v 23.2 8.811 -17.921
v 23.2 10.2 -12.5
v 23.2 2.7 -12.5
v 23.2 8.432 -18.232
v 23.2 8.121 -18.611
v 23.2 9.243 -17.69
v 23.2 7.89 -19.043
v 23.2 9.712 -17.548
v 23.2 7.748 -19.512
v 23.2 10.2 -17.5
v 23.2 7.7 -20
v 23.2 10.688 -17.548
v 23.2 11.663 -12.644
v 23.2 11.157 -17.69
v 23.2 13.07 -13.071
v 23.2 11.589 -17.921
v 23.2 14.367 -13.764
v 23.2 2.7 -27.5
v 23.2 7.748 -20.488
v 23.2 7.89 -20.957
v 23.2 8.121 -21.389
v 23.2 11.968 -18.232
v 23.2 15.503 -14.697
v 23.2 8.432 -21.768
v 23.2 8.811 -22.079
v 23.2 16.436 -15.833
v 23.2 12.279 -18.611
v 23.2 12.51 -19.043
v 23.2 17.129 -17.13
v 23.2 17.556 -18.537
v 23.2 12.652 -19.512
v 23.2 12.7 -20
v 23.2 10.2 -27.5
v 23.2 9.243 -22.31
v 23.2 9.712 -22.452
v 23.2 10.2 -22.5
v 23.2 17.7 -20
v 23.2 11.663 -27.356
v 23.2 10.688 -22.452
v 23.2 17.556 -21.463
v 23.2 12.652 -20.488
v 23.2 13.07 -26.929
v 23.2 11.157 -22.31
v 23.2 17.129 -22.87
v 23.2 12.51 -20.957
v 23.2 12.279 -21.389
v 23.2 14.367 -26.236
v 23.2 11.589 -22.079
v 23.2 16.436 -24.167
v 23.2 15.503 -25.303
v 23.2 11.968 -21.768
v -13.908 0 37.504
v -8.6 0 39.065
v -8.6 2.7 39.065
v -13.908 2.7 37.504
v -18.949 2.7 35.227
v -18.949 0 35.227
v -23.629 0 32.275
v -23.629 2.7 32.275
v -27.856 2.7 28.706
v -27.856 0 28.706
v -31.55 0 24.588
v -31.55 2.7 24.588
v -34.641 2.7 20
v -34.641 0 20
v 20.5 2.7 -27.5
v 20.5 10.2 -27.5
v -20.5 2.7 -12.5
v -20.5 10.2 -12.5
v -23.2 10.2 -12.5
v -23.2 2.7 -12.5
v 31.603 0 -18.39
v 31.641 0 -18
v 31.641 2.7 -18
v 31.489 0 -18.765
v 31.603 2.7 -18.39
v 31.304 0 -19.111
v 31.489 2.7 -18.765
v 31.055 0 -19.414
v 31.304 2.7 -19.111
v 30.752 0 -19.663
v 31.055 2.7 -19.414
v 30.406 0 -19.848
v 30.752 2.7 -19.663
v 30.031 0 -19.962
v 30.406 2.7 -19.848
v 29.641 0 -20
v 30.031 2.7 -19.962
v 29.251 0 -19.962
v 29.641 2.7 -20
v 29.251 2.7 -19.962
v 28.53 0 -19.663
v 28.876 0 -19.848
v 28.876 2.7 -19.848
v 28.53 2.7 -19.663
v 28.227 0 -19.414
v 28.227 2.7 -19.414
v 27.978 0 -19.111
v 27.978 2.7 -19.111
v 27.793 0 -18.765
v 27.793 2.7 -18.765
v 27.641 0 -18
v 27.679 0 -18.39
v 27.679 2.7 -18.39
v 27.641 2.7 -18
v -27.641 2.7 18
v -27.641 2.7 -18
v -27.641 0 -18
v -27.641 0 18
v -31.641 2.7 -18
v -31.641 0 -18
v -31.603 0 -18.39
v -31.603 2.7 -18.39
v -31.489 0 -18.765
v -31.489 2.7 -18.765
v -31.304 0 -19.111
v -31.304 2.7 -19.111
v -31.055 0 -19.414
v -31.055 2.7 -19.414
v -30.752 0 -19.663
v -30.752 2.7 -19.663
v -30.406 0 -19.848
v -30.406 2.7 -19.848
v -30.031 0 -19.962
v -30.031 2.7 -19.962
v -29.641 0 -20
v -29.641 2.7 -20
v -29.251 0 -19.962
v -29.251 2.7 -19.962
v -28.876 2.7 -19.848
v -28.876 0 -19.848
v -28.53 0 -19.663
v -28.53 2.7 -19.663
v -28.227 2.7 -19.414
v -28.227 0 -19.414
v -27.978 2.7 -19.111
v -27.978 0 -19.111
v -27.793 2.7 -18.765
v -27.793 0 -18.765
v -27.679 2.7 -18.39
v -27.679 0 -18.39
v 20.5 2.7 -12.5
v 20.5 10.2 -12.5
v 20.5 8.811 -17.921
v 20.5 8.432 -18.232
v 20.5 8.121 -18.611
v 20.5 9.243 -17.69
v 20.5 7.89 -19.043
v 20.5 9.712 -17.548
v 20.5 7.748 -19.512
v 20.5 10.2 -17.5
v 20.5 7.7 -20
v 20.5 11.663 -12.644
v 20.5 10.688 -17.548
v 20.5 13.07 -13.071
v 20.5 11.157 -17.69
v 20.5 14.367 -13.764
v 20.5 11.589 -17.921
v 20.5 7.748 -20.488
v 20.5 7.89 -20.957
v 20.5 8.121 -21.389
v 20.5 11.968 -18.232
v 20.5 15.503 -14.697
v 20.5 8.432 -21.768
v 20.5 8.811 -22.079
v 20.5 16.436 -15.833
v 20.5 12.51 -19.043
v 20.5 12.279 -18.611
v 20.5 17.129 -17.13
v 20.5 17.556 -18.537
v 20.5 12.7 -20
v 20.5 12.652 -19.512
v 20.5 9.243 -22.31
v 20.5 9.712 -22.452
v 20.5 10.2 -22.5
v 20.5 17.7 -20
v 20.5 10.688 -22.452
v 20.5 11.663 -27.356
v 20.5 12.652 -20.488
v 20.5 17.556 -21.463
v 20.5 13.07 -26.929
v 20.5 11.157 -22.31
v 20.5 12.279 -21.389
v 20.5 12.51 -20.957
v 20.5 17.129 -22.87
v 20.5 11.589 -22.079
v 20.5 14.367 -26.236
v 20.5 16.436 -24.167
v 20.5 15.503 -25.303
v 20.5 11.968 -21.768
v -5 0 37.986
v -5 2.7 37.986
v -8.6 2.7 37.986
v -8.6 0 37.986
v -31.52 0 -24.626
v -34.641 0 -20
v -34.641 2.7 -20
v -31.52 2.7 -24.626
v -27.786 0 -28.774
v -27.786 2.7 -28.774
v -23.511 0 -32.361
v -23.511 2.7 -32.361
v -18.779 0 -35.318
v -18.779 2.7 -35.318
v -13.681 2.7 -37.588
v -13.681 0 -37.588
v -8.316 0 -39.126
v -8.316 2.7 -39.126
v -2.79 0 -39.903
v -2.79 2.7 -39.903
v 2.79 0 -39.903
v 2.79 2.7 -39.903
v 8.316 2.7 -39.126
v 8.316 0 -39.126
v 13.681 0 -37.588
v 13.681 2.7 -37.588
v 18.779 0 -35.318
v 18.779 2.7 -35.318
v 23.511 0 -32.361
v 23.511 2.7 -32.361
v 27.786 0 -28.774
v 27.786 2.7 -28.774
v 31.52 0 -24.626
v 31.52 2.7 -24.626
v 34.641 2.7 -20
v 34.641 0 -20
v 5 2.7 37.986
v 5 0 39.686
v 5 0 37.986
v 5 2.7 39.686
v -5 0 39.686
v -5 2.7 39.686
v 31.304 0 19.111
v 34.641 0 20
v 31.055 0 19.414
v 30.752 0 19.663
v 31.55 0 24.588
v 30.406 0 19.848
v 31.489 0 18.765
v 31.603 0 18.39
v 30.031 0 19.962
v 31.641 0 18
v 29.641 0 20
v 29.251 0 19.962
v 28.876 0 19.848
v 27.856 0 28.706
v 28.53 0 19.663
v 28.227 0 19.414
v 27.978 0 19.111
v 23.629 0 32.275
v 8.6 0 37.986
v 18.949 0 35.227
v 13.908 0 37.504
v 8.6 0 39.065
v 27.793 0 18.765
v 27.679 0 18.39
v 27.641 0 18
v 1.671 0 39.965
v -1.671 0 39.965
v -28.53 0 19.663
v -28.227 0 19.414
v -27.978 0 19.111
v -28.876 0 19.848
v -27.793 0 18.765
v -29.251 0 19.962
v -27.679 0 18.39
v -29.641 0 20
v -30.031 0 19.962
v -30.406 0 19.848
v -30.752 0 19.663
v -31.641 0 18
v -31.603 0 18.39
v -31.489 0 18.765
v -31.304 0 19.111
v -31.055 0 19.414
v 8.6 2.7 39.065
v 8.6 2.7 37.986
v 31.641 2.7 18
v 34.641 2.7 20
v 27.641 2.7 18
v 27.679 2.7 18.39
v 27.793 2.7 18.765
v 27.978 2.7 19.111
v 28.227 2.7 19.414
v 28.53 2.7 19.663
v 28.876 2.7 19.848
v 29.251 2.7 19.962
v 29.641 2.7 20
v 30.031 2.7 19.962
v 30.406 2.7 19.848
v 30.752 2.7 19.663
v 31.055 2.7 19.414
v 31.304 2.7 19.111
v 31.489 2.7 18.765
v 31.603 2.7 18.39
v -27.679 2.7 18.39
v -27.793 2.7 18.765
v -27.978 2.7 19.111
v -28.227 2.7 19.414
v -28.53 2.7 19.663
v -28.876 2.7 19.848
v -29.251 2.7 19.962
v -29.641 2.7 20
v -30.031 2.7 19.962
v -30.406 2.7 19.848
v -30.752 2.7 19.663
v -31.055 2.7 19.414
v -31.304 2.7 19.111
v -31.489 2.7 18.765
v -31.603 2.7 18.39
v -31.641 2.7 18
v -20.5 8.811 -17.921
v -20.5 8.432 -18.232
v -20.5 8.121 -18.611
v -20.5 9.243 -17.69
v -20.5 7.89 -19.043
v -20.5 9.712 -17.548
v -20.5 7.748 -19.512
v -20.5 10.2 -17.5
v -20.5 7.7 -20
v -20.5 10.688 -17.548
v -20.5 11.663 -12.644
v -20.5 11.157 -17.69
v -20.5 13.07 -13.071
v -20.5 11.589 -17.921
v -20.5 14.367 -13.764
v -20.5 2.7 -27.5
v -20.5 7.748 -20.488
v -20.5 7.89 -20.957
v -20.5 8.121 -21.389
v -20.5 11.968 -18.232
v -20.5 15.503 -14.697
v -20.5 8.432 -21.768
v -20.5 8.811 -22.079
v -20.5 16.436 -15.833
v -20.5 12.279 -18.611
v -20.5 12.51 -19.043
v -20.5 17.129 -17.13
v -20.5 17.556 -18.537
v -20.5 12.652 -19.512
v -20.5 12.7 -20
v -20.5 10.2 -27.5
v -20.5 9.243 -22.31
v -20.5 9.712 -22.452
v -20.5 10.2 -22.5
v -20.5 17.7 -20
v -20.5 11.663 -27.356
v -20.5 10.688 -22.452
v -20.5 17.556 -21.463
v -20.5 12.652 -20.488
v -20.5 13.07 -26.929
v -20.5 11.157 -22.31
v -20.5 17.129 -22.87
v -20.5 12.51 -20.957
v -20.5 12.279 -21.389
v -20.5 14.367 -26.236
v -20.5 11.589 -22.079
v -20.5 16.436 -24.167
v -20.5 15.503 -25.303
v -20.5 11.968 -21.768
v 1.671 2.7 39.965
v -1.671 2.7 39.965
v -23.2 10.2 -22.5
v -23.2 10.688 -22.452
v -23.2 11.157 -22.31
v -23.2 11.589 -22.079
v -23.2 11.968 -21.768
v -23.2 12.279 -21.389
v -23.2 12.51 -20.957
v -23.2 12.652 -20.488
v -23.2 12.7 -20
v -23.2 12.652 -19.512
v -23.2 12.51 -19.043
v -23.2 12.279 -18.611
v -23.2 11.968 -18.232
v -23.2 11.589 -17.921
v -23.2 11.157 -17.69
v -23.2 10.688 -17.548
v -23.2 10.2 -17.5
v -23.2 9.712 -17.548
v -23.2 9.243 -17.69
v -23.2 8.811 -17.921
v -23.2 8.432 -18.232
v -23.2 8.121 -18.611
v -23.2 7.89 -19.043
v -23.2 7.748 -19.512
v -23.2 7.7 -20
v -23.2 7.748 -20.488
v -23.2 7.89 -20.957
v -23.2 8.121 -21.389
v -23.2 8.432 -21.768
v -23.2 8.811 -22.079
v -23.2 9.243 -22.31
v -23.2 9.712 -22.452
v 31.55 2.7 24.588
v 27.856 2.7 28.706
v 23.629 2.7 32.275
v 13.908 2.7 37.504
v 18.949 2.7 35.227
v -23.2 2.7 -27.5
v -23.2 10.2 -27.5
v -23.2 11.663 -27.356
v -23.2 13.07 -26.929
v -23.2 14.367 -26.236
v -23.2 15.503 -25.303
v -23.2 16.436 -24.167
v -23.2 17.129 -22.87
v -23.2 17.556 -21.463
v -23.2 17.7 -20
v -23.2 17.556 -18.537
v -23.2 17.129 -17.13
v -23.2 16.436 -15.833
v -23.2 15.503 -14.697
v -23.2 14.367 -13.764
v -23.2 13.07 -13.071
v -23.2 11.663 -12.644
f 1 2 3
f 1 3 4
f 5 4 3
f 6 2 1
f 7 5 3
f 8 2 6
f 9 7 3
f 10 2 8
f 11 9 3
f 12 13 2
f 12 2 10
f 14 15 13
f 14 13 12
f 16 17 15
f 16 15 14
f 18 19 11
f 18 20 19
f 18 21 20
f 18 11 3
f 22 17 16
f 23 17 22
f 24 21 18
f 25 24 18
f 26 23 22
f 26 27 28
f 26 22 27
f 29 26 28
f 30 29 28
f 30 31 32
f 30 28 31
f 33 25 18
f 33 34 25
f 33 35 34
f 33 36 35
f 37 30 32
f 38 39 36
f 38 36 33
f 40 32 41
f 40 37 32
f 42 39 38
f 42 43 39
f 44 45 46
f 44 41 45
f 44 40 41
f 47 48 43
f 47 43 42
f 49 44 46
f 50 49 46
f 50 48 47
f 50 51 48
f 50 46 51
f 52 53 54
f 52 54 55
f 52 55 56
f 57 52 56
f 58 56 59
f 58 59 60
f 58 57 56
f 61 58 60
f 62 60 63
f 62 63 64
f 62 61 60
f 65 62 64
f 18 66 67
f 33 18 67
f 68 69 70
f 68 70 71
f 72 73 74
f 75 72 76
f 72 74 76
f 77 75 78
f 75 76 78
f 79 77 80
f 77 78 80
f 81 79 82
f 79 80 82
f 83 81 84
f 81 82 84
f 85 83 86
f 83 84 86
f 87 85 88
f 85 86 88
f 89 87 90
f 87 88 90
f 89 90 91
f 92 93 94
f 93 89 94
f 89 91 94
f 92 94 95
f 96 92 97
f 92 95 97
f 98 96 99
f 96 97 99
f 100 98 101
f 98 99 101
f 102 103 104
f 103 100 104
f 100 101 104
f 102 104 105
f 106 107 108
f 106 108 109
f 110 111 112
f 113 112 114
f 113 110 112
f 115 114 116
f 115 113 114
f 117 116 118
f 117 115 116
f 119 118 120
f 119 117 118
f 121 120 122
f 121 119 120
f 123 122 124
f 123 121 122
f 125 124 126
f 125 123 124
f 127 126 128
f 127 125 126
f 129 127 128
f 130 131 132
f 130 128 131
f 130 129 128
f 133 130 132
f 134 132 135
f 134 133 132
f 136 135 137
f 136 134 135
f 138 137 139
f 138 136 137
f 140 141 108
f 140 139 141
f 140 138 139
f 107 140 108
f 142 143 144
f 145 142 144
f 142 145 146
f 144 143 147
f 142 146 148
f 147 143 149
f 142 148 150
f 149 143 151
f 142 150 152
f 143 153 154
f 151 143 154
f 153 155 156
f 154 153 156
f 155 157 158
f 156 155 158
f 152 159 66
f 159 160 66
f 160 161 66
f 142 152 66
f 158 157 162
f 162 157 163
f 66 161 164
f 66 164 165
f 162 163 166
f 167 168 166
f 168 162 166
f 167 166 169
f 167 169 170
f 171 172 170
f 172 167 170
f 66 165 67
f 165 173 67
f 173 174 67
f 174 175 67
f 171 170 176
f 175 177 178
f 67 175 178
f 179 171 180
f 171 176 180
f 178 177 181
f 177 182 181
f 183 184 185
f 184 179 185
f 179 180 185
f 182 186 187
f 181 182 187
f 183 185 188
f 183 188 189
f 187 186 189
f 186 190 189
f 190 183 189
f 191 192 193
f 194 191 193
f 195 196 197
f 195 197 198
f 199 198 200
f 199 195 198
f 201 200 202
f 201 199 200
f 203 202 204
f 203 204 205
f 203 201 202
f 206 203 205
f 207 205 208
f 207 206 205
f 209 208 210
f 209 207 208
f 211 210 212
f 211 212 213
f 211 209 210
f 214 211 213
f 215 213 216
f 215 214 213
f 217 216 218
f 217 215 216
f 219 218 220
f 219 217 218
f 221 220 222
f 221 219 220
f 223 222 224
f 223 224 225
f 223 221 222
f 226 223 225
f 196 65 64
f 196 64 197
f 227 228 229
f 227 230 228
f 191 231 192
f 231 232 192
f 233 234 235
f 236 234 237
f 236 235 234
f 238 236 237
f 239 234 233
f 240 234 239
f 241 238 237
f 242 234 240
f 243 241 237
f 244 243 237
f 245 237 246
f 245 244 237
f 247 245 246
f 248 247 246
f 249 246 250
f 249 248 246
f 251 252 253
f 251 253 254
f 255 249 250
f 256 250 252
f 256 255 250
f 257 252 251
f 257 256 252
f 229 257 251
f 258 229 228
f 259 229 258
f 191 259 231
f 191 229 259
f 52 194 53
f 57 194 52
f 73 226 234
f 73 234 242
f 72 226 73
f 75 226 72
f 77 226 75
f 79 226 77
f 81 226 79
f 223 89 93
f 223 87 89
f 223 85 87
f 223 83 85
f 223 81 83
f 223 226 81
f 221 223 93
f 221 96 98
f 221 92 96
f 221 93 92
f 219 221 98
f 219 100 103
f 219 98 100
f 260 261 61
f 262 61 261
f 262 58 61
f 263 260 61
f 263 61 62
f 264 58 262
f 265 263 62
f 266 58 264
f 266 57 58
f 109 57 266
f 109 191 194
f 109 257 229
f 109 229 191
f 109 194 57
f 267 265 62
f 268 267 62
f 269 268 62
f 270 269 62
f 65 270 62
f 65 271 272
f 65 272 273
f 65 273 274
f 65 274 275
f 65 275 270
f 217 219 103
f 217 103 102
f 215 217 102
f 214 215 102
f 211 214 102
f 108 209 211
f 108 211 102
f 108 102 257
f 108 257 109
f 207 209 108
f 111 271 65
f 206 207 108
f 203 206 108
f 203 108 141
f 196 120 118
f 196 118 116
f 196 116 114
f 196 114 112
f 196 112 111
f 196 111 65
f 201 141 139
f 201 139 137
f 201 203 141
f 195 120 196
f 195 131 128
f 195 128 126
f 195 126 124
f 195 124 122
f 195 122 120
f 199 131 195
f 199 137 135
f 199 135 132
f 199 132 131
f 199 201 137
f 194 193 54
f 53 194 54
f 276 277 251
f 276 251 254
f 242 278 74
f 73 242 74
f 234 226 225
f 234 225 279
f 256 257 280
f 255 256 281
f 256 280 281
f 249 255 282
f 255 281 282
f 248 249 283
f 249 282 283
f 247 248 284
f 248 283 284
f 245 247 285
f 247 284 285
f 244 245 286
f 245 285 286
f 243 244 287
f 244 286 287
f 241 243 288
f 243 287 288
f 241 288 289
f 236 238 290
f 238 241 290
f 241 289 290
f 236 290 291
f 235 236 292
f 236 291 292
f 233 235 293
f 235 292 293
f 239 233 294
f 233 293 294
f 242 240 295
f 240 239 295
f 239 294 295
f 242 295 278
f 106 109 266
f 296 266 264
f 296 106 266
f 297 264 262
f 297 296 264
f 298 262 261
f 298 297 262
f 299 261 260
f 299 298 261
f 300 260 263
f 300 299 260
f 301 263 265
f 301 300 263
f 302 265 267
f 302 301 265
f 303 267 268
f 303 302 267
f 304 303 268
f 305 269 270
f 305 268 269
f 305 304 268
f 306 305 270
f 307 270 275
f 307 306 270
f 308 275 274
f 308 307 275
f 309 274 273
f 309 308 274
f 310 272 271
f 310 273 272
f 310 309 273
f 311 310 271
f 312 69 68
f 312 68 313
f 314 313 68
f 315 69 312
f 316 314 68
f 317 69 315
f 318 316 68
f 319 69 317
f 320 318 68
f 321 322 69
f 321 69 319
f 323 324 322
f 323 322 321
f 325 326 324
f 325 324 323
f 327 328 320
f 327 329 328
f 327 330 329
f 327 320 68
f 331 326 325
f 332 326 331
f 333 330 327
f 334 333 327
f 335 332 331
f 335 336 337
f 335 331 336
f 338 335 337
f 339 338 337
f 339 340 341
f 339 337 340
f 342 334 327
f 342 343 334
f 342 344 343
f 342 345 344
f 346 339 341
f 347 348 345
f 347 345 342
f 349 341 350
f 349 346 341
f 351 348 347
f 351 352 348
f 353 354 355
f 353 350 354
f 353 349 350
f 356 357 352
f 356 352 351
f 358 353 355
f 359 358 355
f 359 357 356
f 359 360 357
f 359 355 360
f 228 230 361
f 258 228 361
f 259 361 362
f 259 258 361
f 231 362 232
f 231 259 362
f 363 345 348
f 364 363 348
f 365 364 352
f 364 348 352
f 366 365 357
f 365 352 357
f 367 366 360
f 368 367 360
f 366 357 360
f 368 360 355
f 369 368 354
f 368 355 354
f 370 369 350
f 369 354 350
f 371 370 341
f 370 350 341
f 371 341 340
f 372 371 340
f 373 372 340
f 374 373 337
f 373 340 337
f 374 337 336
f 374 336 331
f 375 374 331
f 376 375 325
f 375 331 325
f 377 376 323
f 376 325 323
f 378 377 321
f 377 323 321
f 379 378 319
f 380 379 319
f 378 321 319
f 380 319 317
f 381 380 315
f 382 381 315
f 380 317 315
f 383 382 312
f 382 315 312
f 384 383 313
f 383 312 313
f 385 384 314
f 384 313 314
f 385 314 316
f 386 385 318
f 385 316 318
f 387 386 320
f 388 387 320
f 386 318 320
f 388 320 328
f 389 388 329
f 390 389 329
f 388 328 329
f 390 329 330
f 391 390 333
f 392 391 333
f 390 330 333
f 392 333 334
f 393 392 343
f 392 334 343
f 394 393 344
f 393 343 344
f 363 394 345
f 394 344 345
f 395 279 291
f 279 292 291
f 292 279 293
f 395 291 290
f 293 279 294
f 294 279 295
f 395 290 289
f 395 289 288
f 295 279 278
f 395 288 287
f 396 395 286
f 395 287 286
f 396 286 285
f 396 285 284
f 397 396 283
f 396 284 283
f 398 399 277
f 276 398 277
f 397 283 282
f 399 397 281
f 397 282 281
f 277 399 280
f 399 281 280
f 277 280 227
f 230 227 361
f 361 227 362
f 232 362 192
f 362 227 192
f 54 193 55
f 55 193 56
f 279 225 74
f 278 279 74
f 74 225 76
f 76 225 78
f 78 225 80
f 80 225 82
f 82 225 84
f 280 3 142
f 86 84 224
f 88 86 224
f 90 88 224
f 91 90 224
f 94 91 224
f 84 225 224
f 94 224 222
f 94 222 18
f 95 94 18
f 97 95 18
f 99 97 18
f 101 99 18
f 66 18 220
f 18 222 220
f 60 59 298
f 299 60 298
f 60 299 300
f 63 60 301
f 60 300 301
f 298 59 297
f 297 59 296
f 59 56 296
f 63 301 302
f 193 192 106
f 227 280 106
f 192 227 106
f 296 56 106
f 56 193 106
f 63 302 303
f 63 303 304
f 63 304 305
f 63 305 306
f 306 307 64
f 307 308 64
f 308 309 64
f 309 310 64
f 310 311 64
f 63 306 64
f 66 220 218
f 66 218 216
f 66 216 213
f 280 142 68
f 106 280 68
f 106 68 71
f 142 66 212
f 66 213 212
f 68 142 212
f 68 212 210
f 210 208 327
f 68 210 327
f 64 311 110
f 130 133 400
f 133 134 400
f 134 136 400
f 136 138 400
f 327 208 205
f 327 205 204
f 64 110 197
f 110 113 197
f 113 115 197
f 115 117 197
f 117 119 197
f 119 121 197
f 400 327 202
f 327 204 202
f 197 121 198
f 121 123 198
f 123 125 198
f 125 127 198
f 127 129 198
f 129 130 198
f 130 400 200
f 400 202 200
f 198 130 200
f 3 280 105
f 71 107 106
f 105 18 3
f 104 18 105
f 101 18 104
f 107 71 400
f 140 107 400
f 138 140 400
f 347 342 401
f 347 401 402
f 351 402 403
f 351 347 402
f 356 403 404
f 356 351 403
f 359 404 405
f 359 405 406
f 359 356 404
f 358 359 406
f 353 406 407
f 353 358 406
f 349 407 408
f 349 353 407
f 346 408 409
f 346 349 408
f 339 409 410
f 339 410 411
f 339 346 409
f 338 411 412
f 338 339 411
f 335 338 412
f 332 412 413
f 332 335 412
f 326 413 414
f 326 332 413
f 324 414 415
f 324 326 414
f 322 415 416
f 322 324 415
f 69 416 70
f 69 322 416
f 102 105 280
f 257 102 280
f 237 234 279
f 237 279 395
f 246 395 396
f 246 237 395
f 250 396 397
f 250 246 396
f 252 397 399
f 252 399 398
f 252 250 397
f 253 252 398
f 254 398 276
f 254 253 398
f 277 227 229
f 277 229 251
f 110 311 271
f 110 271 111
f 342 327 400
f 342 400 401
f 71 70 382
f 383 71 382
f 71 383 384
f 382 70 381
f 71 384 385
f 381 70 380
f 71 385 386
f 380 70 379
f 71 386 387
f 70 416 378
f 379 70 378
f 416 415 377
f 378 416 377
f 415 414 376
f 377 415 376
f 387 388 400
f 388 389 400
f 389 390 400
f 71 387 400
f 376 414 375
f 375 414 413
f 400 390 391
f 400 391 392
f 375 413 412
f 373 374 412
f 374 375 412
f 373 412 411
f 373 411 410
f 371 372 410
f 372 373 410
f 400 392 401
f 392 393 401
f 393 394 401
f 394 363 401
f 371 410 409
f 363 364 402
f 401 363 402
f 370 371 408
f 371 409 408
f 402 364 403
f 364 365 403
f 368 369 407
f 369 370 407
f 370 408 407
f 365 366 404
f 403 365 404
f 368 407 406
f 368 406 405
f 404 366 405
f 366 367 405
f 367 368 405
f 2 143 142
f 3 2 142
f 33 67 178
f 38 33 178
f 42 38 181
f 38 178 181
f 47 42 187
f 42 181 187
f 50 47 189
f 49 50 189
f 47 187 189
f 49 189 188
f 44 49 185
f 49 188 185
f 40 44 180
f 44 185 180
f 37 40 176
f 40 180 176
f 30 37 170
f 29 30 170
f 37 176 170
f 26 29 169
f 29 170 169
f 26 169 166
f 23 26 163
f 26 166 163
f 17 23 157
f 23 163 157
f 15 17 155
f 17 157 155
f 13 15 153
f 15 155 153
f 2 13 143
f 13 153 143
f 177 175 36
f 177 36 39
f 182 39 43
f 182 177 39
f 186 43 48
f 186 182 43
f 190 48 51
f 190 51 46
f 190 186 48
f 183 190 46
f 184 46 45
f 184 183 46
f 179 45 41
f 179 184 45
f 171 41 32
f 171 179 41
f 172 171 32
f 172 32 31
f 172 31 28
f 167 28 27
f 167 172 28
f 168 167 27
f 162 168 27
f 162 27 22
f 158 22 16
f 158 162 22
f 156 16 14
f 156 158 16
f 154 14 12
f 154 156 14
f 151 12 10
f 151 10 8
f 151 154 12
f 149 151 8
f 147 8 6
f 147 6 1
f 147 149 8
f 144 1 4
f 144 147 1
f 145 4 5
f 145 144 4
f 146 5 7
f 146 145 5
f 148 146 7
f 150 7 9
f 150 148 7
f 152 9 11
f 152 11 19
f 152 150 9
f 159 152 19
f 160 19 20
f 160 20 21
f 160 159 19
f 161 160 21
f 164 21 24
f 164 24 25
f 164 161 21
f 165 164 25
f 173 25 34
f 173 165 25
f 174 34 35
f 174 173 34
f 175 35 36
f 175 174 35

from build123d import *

# Parameters (mm, degrees)
BASE_DEPTH            = 2.7
WHEEL_HOLE_REACH      = 54.984
SKETCH3_R             = 2.5
BATTERY_HOLDER_DEPTH  = 2.7
IR_SENSOR_DIVOT_DEPTH = 56


with BuildPart() as part:
    # Sketch1 → Base (new body)
    with BuildSketch(Plane(origin=(0, 0, 0), x_dir=(1, 0, 0), z_dir=(0, 1, 0))):
        with BuildLine():
            Line((34.641016151, 20), (34.641016151, -20))
            ThreePointArc((34.641016151, -20), (0, -40), (-34.641016151, -20))
            Line((-34.641016151, -20), (-34.641016151, 20))
            ThreePointArc((-34.641016151, 20), (0, 40), (34.641016151, 20))
        make_face()
    extrude(amount=BASE_DEPTH)

    # Sketch2 → Wheel Hole (cut, up to next)
    with BuildSketch(Plane(origin=(0, 2.7, 0), x_dir=(-1, 0, 0), z_dir=(0, 1, 0)), mode=Mode.PRIVATE) as wheel_hole_sk1:
        with BuildLine():
            Line((27.641016151, -18), (27.641016151, 18))
            ThreePointArc((27.641016151, 18), (29.641016151, 20), (31.641016151, 18))
            Line((31.641016151, 18), (31.641016151, -18))
            ThreePointArc((31.641016151, -18), (29.641016151, -20), (27.641016151, -18))
        make_face()
    wheel_hole_tool1 = extrude(wheel_hole_sk1.sketch, amount=-WHEEL_HOLE_REACH, mode=Mode.PRIVATE) & part.part
    wheel_hole = wheel_hole_tool1.solids().sort_by_distance((-29.641016, 2.7, 0))[0]
    add(wheel_hole, mode=Mode.SUBTRACT)

    # Sketch3 → Battery Holder (add)
    with BuildSketch(Plane(origin=(-20.5, 0, 0), x_dir=(0, 0, -1), z_dir=(1, 0, 0))):
        with BuildLine():
            Line((27.5, 2.7), (27.5, 10.2))
            ThreePointArc((27.5, 10.2), (20, 17.7), (12.5, 10.2))
            Line((12.5, 10.2), (12.5, 2.7))
            Line((12.5, 2.7), (27.5, 2.7))
        make_face()
        with Locations((20, 10.2)):
            Circle(SKETCH3_R, mode=Mode.SUBTRACT)
    battery_holder = extrude(amount=-BATTERY_HOLDER_DEPTH)

    # Sketch5 → IR Sensor Divot (cut, symmetric)
    with BuildSketch(Plane(origin=(0, 2.7, 0), x_dir=(-1, 0, 0), z_dir=(0, 1, 0))):
        Polygon((5, 229.919345803), (5, 39.686269666), (5, 37.986269666), (8.6, 37.986269666), (8.6, 39.064561946), (8.6, 229.297638083), (73.346792401, 604.214089975), (69.746792401, 604.835797696), align=None)
    ir_sensor_divot = extrude(amount=IR_SENSOR_DIVOT_DEPTH, both=True, mode=Mode.SUBTRACT)

    # Mirror 2: Wheel Hole, Battery Holder, IR Sensor Divot across plane
    add(wheel_hole.mirror(Plane(origin=(0, 0, 0), x_dir=(0, 0, 1), z_dir=(1, 0, 0))), mode=Mode.SUBTRACT)
    add(battery_holder.mirror(Plane(origin=(0, 0, 0), x_dir=(0, 0, 1), z_dir=(1, 0, 0))))
    add(ir_sensor_divot.mirror(Plane(origin=(0, 0, 0), x_dir=(0, 0, 1), z_dir=(1, 0, 0))), mode=Mode.SUBTRACT)


solid = part.part
